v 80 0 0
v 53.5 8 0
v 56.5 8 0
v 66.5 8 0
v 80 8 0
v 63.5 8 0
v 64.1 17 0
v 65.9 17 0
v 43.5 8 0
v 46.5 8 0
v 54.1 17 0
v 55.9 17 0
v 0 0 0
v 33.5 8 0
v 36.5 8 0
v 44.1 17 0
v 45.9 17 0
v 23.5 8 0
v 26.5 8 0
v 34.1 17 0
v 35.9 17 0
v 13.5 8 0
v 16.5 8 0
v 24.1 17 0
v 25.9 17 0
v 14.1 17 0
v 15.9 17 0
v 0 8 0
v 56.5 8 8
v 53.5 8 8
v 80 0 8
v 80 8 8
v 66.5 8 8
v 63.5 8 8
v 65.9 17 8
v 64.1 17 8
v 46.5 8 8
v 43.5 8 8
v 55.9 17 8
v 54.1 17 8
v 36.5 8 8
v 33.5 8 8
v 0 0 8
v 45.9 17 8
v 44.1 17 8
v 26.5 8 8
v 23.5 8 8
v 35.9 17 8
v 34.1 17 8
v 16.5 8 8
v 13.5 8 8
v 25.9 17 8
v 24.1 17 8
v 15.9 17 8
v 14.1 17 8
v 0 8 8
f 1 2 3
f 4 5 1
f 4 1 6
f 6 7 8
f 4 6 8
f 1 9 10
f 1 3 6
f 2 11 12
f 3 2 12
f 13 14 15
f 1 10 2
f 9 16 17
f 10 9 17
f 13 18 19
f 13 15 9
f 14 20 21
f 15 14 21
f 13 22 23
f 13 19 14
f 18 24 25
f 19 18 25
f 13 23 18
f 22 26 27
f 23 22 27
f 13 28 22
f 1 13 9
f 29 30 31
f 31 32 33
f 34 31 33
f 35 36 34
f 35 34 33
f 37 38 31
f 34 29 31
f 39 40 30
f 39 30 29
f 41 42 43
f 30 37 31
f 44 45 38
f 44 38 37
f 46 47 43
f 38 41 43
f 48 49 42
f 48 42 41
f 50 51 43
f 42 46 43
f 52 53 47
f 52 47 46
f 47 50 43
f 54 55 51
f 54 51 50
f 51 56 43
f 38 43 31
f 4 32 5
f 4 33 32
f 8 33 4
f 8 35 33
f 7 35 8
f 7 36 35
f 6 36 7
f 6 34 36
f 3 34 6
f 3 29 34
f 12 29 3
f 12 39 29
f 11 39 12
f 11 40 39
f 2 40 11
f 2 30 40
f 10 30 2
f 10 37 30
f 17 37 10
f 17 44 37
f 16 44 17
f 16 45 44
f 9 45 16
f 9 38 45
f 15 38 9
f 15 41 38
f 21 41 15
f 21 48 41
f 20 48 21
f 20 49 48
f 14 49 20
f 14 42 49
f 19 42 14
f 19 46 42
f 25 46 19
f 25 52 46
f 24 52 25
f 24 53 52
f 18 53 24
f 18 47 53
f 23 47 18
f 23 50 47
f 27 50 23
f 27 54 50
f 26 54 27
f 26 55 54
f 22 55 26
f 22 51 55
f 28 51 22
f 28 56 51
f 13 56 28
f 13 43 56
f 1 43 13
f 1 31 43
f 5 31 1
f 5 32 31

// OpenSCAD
$fn = 32;

// ----------------------------------------------------------------------
// Gear rack: 6 teeth on a 80 mm bar, pitch 10 mm
// ----------------------------------------------------------------------

// --- parameters (mm) ---
profile_height = 8;       // extrusion height
profile_points = 28;      // points of the closed outline

profile = [[0, 0], [80, 0], [80, 8], [66.5, 8], [65.9, 17], [64.1, 17], [63.5, 8], [56.5, 8], [55.9, 17], [54.1, 17], [53.5, 8], [46.5, 8], [45.9, 17], [44.1, 17], [43.5, 8], [36.5, 8], [35.9, 17], [34.1, 17], [33.5, 8], [26.5, 8], [25.9, 17], [24.1, 17], [23.5, 8], [16.5, 8], [15.9, 17], [14.1, 17], [13.5, 8], [0, 8]];  // single closed polygon, 28 points, counter clockwise

// --- the one profile operation ---
linear_extrude(height = profile_height) polygon(points = profile);
